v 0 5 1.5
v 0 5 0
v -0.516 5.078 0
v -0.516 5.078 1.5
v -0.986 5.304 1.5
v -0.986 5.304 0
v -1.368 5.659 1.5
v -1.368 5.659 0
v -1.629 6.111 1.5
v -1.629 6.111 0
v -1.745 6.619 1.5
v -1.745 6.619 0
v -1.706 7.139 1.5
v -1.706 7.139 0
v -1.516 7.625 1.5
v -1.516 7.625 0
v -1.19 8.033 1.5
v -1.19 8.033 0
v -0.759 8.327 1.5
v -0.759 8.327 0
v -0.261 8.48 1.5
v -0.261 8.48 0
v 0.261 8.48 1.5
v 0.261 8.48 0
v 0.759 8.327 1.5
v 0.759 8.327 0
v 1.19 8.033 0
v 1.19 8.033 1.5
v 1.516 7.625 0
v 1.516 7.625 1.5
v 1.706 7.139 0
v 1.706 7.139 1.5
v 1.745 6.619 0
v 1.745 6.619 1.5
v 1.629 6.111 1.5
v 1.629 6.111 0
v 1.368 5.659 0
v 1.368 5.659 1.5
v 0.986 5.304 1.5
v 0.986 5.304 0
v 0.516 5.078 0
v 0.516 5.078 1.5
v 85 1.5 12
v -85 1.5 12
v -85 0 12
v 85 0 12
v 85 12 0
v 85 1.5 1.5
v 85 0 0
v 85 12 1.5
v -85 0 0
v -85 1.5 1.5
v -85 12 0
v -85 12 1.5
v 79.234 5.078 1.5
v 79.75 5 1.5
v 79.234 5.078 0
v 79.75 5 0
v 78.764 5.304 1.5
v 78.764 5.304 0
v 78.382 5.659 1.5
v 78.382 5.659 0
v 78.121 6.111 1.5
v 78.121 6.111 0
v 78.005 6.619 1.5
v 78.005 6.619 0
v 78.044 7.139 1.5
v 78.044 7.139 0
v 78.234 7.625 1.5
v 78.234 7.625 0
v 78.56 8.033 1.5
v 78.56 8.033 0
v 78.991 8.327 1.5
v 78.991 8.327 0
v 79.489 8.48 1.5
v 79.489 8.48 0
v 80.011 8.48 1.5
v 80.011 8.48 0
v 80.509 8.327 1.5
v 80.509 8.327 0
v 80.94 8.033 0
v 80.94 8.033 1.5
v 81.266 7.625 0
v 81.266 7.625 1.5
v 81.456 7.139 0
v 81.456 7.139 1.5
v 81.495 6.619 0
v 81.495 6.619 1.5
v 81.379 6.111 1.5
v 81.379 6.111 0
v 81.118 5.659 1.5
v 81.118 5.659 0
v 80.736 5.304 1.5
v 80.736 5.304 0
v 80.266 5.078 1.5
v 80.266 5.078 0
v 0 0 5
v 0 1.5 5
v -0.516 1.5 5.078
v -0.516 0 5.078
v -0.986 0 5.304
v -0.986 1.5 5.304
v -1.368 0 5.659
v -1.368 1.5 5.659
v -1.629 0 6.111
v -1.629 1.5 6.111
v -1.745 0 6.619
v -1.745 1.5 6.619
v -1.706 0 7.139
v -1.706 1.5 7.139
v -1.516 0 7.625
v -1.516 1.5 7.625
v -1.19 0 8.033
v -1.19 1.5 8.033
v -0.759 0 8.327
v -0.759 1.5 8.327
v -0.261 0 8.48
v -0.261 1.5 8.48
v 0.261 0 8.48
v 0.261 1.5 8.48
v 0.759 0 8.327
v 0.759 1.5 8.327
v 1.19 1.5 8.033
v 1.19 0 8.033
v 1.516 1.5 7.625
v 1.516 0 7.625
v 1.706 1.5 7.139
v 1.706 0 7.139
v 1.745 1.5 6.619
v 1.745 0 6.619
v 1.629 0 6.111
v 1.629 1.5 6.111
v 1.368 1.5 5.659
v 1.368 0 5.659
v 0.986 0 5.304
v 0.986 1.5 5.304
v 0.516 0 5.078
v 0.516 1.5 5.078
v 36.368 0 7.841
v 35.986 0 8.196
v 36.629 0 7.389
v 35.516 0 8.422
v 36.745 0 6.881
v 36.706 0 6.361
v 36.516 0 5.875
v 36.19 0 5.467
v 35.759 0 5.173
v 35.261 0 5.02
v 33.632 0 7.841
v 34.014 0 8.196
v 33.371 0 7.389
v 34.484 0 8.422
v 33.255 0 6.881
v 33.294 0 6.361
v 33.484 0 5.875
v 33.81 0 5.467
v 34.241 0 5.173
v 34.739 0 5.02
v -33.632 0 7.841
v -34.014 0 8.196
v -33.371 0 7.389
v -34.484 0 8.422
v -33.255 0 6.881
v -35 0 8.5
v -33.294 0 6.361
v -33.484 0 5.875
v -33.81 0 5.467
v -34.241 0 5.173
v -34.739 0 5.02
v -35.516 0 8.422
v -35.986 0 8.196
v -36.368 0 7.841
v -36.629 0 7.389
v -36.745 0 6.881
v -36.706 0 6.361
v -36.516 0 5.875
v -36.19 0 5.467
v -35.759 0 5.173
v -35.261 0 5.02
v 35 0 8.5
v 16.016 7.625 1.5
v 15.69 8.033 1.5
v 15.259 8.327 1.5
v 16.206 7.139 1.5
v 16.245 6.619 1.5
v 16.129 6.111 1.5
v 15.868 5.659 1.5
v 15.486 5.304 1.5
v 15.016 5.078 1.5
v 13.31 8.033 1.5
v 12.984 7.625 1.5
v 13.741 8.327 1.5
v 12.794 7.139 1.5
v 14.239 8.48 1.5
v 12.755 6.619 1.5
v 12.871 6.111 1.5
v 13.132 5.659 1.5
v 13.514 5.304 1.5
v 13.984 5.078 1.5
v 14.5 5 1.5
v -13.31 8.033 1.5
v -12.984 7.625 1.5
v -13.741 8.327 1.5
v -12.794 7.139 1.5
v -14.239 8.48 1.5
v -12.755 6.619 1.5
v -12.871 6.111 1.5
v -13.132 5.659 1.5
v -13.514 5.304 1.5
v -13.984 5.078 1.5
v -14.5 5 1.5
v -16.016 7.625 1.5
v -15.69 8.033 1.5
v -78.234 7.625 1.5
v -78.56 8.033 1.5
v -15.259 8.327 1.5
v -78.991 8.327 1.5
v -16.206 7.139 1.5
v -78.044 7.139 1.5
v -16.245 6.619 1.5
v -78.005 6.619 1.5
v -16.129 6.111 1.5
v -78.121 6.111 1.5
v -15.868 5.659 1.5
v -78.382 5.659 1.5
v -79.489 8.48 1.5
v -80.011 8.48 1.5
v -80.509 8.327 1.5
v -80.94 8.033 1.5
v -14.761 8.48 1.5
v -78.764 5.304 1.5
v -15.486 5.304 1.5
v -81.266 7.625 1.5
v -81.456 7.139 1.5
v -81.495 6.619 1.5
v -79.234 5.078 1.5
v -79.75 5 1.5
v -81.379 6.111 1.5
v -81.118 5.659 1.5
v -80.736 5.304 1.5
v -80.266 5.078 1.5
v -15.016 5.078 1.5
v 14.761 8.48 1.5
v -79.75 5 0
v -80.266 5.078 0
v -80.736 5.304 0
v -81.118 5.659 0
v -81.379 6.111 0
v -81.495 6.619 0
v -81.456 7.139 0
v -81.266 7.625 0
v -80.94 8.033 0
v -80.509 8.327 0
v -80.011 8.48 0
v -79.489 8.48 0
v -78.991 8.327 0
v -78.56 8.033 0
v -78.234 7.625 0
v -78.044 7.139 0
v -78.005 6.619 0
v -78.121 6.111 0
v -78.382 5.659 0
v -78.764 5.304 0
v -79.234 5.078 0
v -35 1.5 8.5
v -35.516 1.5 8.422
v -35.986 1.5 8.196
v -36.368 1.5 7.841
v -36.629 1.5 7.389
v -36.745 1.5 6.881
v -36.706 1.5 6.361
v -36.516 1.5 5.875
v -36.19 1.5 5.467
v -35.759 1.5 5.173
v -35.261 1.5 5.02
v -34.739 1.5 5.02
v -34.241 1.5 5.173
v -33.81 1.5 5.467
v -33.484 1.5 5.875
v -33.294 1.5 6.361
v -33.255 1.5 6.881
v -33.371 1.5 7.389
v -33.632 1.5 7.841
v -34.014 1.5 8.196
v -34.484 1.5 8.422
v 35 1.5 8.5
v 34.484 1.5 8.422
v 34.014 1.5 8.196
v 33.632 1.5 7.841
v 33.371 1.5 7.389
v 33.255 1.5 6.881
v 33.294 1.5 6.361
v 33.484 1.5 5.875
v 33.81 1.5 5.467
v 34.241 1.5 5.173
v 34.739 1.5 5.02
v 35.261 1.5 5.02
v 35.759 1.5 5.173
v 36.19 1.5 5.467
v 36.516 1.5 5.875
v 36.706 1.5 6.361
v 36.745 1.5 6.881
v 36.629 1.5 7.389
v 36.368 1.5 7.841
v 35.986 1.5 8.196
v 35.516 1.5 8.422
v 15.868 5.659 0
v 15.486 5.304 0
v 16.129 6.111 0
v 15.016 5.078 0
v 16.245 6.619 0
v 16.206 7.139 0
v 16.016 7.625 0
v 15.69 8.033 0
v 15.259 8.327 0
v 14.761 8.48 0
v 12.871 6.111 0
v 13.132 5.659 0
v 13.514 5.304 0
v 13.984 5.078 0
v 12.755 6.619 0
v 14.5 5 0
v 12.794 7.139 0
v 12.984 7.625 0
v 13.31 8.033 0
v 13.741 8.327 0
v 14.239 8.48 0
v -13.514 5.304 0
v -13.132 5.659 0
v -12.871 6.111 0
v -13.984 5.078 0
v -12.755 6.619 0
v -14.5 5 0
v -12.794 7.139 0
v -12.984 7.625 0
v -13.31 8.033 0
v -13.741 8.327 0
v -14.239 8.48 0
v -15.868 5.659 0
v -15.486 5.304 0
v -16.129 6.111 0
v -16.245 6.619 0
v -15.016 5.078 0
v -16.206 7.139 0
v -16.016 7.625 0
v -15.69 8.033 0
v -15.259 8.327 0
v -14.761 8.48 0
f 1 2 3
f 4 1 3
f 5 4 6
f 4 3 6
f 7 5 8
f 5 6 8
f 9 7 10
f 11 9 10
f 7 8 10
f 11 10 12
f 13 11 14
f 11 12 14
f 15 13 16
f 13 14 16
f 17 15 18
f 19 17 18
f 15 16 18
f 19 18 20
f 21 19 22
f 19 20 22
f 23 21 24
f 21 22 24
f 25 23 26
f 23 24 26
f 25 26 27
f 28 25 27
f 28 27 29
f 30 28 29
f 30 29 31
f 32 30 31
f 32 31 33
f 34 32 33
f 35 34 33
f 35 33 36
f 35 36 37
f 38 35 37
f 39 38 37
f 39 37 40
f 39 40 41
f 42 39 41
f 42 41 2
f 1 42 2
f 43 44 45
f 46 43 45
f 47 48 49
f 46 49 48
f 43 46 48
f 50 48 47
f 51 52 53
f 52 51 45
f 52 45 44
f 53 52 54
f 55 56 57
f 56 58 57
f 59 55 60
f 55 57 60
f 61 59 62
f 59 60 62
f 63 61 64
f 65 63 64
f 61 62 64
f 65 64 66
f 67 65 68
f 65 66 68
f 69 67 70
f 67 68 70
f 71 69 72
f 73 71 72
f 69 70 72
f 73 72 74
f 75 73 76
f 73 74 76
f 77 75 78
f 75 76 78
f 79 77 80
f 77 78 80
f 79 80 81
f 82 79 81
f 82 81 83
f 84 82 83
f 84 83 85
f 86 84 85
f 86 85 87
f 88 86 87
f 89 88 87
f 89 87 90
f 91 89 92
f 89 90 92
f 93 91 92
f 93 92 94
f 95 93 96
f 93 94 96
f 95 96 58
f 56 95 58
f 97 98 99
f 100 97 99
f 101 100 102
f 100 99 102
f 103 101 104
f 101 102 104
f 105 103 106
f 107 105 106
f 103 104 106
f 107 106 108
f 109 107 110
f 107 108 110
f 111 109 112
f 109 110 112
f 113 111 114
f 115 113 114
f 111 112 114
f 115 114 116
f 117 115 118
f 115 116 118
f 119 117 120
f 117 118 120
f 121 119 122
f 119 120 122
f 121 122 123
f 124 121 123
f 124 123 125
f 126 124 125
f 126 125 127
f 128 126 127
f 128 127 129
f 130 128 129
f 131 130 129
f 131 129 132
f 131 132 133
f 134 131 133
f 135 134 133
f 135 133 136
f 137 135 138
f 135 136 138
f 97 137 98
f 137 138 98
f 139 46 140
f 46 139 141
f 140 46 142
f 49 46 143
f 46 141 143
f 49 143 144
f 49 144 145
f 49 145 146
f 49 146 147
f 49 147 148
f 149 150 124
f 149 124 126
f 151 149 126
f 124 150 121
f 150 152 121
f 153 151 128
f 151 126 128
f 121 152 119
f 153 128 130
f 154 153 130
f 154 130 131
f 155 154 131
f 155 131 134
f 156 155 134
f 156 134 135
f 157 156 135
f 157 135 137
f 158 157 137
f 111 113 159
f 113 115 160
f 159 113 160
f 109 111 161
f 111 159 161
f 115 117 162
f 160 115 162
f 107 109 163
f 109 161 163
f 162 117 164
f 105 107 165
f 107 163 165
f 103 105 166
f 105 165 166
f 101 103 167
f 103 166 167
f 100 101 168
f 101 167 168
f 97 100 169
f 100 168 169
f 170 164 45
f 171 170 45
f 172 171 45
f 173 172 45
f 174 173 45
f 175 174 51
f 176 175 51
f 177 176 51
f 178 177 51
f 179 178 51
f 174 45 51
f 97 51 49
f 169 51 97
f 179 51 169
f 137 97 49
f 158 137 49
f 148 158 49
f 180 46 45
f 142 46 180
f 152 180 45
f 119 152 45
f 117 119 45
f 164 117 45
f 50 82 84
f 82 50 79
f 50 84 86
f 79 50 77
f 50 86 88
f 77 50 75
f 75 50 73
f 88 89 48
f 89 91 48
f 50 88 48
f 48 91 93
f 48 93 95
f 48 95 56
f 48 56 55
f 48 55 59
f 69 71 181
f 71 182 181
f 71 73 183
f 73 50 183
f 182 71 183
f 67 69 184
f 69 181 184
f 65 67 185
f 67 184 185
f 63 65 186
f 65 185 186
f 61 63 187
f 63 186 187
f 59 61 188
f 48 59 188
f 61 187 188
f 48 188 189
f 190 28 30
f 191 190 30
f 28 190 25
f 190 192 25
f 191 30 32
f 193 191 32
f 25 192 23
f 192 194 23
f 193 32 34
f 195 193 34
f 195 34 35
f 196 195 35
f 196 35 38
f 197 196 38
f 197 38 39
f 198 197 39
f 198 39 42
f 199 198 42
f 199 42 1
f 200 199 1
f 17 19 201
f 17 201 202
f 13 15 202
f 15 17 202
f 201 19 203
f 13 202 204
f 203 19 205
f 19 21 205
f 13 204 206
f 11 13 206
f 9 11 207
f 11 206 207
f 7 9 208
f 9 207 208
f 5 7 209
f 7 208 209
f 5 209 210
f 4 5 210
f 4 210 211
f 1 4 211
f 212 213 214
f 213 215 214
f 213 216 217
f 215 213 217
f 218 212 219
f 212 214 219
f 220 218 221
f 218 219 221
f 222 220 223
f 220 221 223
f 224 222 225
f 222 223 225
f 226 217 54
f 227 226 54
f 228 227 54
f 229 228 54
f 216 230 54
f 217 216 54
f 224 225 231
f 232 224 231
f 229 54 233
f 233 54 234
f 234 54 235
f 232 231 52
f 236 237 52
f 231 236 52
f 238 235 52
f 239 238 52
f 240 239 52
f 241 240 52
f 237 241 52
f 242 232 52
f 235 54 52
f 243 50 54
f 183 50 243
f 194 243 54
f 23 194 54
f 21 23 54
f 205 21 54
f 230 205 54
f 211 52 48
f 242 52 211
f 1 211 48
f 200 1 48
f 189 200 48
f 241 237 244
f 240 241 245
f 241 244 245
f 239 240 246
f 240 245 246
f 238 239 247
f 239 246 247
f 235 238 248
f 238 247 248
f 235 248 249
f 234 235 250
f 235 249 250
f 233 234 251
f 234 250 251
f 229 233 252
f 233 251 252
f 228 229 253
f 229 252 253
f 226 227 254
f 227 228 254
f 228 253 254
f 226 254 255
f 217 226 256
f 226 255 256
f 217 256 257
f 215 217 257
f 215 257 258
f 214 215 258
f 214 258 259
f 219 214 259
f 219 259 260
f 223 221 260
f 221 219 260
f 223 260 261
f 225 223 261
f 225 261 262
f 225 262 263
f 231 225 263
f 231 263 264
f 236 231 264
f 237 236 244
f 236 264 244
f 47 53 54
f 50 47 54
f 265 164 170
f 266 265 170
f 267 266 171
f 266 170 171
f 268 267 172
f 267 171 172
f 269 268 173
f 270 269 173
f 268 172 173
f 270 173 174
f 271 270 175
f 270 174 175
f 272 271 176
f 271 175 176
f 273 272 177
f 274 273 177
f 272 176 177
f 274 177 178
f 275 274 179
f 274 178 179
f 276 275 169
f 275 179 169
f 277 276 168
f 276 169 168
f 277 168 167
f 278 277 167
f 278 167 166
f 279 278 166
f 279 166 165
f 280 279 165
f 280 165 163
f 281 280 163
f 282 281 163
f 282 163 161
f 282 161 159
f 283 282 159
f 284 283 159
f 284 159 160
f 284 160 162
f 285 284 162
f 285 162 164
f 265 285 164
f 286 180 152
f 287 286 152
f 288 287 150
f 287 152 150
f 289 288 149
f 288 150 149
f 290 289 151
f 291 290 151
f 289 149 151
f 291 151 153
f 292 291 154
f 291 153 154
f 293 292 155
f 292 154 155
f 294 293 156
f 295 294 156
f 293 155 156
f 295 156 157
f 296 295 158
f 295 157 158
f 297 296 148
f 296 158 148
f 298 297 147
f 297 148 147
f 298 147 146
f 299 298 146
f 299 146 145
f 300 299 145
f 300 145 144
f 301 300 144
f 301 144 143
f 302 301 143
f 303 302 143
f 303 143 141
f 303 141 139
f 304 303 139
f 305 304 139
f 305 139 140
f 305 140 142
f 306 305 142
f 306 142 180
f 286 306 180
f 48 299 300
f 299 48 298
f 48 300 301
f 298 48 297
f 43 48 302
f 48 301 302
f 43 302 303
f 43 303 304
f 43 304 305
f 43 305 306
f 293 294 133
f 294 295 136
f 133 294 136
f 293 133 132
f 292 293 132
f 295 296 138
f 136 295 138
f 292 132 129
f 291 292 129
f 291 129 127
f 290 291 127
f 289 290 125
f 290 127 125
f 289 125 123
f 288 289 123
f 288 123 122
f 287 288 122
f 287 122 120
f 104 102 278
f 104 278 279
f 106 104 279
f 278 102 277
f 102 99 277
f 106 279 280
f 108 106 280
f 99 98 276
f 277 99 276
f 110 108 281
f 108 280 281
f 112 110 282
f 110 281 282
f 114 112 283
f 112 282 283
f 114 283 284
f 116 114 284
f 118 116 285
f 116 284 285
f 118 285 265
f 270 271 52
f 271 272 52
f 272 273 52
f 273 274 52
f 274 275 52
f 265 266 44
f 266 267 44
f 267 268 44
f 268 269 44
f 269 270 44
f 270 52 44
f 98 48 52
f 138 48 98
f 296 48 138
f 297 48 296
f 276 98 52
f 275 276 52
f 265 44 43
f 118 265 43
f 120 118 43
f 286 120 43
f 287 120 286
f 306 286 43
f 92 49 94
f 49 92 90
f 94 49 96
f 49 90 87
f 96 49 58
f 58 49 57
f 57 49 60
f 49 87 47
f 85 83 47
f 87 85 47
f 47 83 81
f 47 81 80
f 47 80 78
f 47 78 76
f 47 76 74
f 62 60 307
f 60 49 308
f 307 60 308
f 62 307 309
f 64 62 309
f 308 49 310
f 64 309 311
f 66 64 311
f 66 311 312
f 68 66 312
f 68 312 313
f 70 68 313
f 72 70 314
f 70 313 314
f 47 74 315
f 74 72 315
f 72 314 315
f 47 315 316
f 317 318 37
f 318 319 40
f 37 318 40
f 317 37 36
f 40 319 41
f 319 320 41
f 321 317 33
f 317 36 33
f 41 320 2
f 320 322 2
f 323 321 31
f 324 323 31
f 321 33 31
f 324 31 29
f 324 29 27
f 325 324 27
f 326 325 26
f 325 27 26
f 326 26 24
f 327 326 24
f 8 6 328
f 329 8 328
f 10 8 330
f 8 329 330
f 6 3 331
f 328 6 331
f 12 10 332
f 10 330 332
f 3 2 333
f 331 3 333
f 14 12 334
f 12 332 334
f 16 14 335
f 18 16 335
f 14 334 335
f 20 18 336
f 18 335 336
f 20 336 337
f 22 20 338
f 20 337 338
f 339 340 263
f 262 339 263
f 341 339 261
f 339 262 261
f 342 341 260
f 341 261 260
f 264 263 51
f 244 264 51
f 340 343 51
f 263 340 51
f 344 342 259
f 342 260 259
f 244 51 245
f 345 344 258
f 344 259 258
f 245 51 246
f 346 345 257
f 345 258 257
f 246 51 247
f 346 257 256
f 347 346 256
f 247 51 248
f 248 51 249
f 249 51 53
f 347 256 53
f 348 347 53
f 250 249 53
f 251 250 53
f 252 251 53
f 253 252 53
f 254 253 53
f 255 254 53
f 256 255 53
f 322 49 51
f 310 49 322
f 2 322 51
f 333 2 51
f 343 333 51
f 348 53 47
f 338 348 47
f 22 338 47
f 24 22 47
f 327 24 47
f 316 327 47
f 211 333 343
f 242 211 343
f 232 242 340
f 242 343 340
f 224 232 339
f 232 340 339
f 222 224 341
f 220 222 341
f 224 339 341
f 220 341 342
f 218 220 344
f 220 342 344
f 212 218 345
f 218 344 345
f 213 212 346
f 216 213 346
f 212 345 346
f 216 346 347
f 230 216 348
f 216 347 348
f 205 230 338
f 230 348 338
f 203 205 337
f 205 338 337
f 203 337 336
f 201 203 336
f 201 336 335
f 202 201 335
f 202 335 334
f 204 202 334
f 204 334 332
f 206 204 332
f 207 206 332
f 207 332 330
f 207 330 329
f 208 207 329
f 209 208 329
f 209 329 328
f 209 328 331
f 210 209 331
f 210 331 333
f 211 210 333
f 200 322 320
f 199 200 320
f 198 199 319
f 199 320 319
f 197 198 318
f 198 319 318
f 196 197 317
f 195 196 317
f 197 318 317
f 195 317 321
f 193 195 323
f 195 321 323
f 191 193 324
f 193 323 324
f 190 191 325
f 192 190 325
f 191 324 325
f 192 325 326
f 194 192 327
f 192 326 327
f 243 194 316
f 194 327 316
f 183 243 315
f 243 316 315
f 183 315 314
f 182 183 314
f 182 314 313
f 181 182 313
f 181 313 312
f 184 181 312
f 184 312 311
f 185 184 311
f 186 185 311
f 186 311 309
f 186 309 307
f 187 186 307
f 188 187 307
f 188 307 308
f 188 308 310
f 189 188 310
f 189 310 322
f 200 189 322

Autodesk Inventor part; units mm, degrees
ref_plane "YZ Plane" through (0, 0, 0) normal (1, 0, 0) x (0, 1, 0)
ref_plane "XZ Plane" through (0, 0, 0) normal (0, 1, 0) x (-1, 0, 0)
ref_plane "XY Plane" through (0, 0, 0) normal (0, 0, 1) x (1, 0, 0)
sketch "Szkic1" plane through (0, 0, 0) normal (1, 0, 0) x (0, 1, 0)
  line L0 (0, 0) -> (12, 0)
  line L1 (12, 0) -> (12, 1.5)
  line L2 (12, 1.5) -> (1.5, 1.5)
  line L3 (1.5, 1.5) -> (1.5, 12)
  line L4 (1.5, 12) -> (0, 12)
  line L5 (0, 12) -> (0, 0)
  dimension "d0" = 12
  dimension "d1" = 1.5
  dimension "d2" = 10.5
  dimension "d3" = 10.5
extrude "Wyciągnięcie proste1" add sketch "Szkic1" along normal mid plane 170
sketch "Szkic2" plane through (-85, 0, 0) normal (0, -1, 0) x (1, 0, 0)
  line L0 (0, 12) -> (170, 12) projected
  line L1 (85, 0) -> (85, 6.75) construction
  dimension "d6" = 5.25
hole "Otwór1" at (0, 0, 6.75) direction (0, 1, 0) diameter 3.5 end through all
sketch "Szkic3" plane through (-85, 1.5, 1.5) normal (0, 0, 1) x (1, 0, 0)
  line L0 (0, 10.5) -> (170, 10.5) construction
  line L1 (85, 10.5) -> (85, 5.25) construction
  point P0 (85, -1.5)
  dimension "d14" = 5.25
hole "Otwór2" at (0, 6.75, 1.5) direction (0, 0, -1) diameter 3.5 end through all
sketch "Szkic4" plane through (-85, 1.5, 1.5) normal (0, 0, 1) x (1, 0, 0)
  line L0 (170, 10.5) -> (170, 0) projected
  line L1 (0, 10.5) -> (170, 10.5) projected
  point P0 (85, -1.5)
  point P1 (164.75, 5.25)
  dimension "d22" = 5.25
  dimension "d23" = 5.25
hole "Otwór3" at (79.75, 6.75, 1.5) direction (0, 0, -1) diameter 3.5 end through all
mirror "Odbij1" about plane through (0, 0, 0) normal (1, 0, 0) of "Otwór3"
pattern_linear "Szyk prostokątny1" count 3 spacing 14.5 along (1, 0, 0) of "Otwór2" first direction both ways yes
sketch "Szkic5" plane through (-85, 1.5, 12) normal (0, 1, 0) x (1, 0, 0)
  line L0 (0, 0) -> (170, 0) construction
  circle A0 centre (85, 5.25) radius 1.75 construction
  line L1 (85, 0) -> (85, 5.25) construction
  line L2 (120, 5.25) -> (50, 5.25) construction
  point P0 (85, 12)
  dimension "d34" = 70
hole "Otwór4" at (-35, 1.5, 6.75) at (35, 1.5, 6.75) direction (0, -1, 0) diameter 3.5 end through all
properties part number "bepf_platforma_rama_bok_dlugi" material "Aluminium 6061"
